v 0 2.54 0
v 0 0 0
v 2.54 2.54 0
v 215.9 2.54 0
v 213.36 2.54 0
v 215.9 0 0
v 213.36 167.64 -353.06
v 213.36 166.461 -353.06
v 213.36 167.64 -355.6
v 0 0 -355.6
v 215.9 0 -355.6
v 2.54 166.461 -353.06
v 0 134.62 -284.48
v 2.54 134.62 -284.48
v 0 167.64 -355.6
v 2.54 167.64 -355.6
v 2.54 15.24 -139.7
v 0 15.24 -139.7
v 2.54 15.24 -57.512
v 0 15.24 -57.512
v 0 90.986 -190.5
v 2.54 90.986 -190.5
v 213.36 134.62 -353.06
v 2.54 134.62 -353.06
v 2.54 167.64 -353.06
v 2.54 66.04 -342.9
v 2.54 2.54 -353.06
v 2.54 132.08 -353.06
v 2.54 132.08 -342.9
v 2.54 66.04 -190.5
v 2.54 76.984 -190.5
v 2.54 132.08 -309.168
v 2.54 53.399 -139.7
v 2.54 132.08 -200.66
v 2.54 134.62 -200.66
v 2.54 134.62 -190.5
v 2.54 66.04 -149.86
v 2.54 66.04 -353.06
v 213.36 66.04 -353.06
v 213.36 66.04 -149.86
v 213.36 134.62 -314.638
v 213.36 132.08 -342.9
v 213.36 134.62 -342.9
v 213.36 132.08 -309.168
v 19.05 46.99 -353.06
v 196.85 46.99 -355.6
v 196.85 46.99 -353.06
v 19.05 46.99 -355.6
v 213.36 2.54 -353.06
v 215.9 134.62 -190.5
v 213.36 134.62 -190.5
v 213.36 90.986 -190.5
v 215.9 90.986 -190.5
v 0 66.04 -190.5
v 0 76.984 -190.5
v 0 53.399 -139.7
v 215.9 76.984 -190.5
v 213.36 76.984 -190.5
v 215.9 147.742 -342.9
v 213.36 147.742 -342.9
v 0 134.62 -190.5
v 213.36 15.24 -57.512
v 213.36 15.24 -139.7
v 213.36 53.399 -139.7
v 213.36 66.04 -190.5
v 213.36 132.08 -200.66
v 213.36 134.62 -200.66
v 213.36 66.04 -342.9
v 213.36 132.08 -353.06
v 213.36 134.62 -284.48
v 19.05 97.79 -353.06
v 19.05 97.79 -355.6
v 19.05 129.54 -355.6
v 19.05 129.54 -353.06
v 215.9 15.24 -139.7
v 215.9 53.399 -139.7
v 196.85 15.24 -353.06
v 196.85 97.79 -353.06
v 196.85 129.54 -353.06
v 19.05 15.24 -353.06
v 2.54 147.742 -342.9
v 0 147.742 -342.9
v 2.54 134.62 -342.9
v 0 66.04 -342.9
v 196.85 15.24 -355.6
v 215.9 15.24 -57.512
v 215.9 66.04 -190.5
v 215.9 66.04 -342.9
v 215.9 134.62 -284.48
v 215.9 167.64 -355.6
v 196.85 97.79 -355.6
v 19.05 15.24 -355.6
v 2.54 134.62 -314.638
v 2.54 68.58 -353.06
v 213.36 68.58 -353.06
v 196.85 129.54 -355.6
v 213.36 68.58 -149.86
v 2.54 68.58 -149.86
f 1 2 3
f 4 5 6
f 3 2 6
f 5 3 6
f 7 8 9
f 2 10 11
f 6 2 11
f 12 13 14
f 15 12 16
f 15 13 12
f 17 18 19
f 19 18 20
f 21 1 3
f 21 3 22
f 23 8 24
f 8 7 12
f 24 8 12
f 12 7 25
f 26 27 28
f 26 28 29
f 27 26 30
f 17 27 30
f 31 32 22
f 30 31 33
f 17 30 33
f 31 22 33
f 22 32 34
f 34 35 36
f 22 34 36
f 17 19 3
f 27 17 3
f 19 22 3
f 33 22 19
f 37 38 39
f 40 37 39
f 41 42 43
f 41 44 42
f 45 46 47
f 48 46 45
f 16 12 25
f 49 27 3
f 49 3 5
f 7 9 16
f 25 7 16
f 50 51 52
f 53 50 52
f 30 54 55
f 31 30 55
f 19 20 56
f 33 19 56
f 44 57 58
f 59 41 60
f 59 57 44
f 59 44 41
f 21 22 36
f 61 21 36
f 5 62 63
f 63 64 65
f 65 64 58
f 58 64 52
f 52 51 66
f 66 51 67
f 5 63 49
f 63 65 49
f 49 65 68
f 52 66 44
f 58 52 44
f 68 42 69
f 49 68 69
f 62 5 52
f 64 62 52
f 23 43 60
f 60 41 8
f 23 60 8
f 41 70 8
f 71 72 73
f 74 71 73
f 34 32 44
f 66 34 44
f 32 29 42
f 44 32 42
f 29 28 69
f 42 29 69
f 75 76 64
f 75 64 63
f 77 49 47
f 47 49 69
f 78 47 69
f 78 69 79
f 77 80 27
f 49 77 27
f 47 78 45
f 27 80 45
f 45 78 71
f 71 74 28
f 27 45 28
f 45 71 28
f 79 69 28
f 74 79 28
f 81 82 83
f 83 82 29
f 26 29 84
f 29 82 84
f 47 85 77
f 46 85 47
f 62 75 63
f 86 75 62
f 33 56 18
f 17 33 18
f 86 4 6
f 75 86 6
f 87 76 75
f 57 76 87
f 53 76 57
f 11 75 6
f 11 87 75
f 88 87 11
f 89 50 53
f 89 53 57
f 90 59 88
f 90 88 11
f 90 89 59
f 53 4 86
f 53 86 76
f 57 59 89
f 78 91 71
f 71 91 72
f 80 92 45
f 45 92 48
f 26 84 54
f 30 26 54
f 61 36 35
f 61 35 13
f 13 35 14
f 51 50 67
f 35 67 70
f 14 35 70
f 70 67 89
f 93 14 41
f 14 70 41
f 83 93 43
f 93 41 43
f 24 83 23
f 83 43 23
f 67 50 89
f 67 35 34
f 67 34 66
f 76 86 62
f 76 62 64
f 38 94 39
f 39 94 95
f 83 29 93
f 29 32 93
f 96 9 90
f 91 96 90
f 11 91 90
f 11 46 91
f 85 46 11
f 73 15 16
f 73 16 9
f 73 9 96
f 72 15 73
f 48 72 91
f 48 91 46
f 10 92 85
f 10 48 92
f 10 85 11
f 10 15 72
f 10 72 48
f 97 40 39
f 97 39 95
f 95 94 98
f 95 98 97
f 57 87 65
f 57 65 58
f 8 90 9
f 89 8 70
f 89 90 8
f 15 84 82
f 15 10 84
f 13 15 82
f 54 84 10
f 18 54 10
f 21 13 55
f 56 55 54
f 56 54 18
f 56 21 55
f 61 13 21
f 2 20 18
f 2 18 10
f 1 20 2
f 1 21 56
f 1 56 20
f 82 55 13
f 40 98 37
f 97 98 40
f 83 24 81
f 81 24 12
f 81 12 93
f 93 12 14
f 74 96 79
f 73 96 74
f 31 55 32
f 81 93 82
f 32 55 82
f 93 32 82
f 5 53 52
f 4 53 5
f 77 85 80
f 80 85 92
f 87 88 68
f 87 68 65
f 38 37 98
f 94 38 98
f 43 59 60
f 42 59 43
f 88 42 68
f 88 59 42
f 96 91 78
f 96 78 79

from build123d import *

# Parameters (mm, degrees)
SKETCH1_W           = 215.9
SKETCH1_H           = 355.6
BOSS_EXTRUDE1_DEPTH = 2.54
BOSS_EXTRUDE2_DEPTH = 2.54
CUT_EXTRUDE4_DEPTH  = 2.54
BOSS_EXTRUDE3_DEPTH = 2.54
CUT_EXTRUDE5_DEPTH  = 2.54
SKETCH7_W           = 210.82
SKETCH7_H           = 165.1
SKETCH7_W_2         = 177.8
SKETCH7_H_2         = 31.75
BOSS_EXTRUDE4_DEPTH = 2.54
SKETCH8_W           = 210.82
SKETCH8_H           = 2.54
BOSS_EXTRUDE6_DEPTH = 203.2
SKETCH9_W           = 210.82
SKETCH9_H           = 2.54
BOSS_EXTRUDE7_DEPTH = 152.4
BOSS_EXTRUDE8_START = -2.54
BOSS_EXTRUDE8_DEPTH = 2.54
BOSS_EXTRUDE9_START = -2.54
BOSS_EXTRUDE9_DEPTH = 2.54


with BuildPart() as part:
    # Sketch1 → Boss-Extrude1 (new body)
    with BuildSketch(Plane(origin=(0, 0, 0), x_dir=(1, 0, 0), z_dir=(0, 1, 0))):
        with Locations((107.95, 177.8)):
            Rectangle(SKETCH1_W, SKETCH1_H)
    extrude(amount=BOSS_EXTRUDE1_DEPTH)

    # Sketch2 → Boss-Extrude2 (add)
    with BuildSketch(Plane(origin=(215.9, 0, 0), x_dir=(0, 0, -1), z_dir=(1, 0, 0))):
        Polygon((355.6, 2.54), (355.6, 167.64), (0, 2.54), align=None)
    extrude(amount=-BOSS_EXTRUDE2_DEPTH)

    # Sketch3 → Cut-Extrude4 (cut)
    with BuildSketch(Plane(origin=(215.9, 0, 0), x_dir=(0, 0, -1), z_dir=(1, 0, 0))):
        Polygon((139.7, 15.24), (57.51214351, 15.24), (139.7, 53.398647656), align=None)
        Polygon((190.5, 66.04), (190.5, 76.984361942), (342.9, 147.741504799), (342.9, 66.04), align=None)
    extrude(amount=-CUT_EXTRUDE4_DEPTH, mode=Mode.SUBTRACT)

    # Sketch5 → Boss-Extrude3 (add)
    with BuildSketch(Plane.ZY):
        Polygon((0, 2.54), (-355.6, 167.64), (-355.6, 2.54), align=None)
    extrude(amount=-BOSS_EXTRUDE3_DEPTH)

    # Sketch6 → Cut-Extrude5 (cut)
    with BuildSketch(Plane.ZY):
        Polygon((-139.7, 15.24), (-57.51214351, 15.24), (-139.7, 53.398647656), align=None)
        Polygon((-342.9, 66.04), (-190.5, 66.04), (-190.5, 76.984361942), (-342.9, 147.741504799), align=None)
    extrude(amount=-CUT_EXTRUDE5_DEPTH, mode=Mode.SUBTRACT)

    # Sketch7 → Boss-Extrude4 (add)
    with BuildSketch(Plane(origin=(0, 0, -355.6), x_dir=(-1, 0, 0), z_dir=(0, 0, -1))):
        with Locations((-107.95, 85.09)):
            Rectangle(SKETCH7_W, SKETCH7_H)
        with Locations((-107.95, 31.115)):
            Rectangle(SKETCH7_W_2, SKETCH7_H_2, mode=Mode.SUBTRACT)
        with Locations((-107.95, 113.665)):
            Rectangle(SKETCH7_W_2, SKETCH7_H_2, mode=Mode.SUBTRACT)
    extrude(amount=-BOSS_EXTRUDE4_DEPTH)

    # Sketch9 → Boss-Extrude7 (add)
    with BuildSketch(Plane.XY.offset(-353.06)):
        with Locations((107.95, 133.35)):
            Rectangle(SKETCH9_W, SKETCH9_H)
    extrude(amount=BOSS_EXTRUDE7_DEPTH)

    # Sketch10 → Boss-Extrude8 (add)
    with BuildSketch(Plane(origin=(215.9, 0, 0), x_dir=(0, 0, -1), z_dir=(1, 0, 0)).offset(BOSS_EXTRUDE8_START)):
        Polygon((284.48, 134.62), (190.5, 134.62), (190.5, 90.986428571), align=None)
    extrude(amount=BOSS_EXTRUDE8_DEPTH)

    # Sketch11 → Boss-Extrude9 (add)
    with BuildSketch(Plane.ZY.offset(BOSS_EXTRUDE9_START)):
        Polygon((-190.5, 134.62), (-284.48, 134.62), (-190.5, 90.986428571), align=None)
    extrude(amount=BOSS_EXTRUDE9_DEPTH)


with BuildPart() as body_2:
    # Sketch8 → Boss-Extrude6 (new body)
    with BuildSketch(Plane.XY.offset(-353.06)):
        with Locations((107.95, 67.31)):
            Rectangle(SKETCH8_W, SKETCH8_H)
    extrude(amount=BOSS_EXTRUDE6_DEPTH)


solid = Compound([part.part, body_2.part])
